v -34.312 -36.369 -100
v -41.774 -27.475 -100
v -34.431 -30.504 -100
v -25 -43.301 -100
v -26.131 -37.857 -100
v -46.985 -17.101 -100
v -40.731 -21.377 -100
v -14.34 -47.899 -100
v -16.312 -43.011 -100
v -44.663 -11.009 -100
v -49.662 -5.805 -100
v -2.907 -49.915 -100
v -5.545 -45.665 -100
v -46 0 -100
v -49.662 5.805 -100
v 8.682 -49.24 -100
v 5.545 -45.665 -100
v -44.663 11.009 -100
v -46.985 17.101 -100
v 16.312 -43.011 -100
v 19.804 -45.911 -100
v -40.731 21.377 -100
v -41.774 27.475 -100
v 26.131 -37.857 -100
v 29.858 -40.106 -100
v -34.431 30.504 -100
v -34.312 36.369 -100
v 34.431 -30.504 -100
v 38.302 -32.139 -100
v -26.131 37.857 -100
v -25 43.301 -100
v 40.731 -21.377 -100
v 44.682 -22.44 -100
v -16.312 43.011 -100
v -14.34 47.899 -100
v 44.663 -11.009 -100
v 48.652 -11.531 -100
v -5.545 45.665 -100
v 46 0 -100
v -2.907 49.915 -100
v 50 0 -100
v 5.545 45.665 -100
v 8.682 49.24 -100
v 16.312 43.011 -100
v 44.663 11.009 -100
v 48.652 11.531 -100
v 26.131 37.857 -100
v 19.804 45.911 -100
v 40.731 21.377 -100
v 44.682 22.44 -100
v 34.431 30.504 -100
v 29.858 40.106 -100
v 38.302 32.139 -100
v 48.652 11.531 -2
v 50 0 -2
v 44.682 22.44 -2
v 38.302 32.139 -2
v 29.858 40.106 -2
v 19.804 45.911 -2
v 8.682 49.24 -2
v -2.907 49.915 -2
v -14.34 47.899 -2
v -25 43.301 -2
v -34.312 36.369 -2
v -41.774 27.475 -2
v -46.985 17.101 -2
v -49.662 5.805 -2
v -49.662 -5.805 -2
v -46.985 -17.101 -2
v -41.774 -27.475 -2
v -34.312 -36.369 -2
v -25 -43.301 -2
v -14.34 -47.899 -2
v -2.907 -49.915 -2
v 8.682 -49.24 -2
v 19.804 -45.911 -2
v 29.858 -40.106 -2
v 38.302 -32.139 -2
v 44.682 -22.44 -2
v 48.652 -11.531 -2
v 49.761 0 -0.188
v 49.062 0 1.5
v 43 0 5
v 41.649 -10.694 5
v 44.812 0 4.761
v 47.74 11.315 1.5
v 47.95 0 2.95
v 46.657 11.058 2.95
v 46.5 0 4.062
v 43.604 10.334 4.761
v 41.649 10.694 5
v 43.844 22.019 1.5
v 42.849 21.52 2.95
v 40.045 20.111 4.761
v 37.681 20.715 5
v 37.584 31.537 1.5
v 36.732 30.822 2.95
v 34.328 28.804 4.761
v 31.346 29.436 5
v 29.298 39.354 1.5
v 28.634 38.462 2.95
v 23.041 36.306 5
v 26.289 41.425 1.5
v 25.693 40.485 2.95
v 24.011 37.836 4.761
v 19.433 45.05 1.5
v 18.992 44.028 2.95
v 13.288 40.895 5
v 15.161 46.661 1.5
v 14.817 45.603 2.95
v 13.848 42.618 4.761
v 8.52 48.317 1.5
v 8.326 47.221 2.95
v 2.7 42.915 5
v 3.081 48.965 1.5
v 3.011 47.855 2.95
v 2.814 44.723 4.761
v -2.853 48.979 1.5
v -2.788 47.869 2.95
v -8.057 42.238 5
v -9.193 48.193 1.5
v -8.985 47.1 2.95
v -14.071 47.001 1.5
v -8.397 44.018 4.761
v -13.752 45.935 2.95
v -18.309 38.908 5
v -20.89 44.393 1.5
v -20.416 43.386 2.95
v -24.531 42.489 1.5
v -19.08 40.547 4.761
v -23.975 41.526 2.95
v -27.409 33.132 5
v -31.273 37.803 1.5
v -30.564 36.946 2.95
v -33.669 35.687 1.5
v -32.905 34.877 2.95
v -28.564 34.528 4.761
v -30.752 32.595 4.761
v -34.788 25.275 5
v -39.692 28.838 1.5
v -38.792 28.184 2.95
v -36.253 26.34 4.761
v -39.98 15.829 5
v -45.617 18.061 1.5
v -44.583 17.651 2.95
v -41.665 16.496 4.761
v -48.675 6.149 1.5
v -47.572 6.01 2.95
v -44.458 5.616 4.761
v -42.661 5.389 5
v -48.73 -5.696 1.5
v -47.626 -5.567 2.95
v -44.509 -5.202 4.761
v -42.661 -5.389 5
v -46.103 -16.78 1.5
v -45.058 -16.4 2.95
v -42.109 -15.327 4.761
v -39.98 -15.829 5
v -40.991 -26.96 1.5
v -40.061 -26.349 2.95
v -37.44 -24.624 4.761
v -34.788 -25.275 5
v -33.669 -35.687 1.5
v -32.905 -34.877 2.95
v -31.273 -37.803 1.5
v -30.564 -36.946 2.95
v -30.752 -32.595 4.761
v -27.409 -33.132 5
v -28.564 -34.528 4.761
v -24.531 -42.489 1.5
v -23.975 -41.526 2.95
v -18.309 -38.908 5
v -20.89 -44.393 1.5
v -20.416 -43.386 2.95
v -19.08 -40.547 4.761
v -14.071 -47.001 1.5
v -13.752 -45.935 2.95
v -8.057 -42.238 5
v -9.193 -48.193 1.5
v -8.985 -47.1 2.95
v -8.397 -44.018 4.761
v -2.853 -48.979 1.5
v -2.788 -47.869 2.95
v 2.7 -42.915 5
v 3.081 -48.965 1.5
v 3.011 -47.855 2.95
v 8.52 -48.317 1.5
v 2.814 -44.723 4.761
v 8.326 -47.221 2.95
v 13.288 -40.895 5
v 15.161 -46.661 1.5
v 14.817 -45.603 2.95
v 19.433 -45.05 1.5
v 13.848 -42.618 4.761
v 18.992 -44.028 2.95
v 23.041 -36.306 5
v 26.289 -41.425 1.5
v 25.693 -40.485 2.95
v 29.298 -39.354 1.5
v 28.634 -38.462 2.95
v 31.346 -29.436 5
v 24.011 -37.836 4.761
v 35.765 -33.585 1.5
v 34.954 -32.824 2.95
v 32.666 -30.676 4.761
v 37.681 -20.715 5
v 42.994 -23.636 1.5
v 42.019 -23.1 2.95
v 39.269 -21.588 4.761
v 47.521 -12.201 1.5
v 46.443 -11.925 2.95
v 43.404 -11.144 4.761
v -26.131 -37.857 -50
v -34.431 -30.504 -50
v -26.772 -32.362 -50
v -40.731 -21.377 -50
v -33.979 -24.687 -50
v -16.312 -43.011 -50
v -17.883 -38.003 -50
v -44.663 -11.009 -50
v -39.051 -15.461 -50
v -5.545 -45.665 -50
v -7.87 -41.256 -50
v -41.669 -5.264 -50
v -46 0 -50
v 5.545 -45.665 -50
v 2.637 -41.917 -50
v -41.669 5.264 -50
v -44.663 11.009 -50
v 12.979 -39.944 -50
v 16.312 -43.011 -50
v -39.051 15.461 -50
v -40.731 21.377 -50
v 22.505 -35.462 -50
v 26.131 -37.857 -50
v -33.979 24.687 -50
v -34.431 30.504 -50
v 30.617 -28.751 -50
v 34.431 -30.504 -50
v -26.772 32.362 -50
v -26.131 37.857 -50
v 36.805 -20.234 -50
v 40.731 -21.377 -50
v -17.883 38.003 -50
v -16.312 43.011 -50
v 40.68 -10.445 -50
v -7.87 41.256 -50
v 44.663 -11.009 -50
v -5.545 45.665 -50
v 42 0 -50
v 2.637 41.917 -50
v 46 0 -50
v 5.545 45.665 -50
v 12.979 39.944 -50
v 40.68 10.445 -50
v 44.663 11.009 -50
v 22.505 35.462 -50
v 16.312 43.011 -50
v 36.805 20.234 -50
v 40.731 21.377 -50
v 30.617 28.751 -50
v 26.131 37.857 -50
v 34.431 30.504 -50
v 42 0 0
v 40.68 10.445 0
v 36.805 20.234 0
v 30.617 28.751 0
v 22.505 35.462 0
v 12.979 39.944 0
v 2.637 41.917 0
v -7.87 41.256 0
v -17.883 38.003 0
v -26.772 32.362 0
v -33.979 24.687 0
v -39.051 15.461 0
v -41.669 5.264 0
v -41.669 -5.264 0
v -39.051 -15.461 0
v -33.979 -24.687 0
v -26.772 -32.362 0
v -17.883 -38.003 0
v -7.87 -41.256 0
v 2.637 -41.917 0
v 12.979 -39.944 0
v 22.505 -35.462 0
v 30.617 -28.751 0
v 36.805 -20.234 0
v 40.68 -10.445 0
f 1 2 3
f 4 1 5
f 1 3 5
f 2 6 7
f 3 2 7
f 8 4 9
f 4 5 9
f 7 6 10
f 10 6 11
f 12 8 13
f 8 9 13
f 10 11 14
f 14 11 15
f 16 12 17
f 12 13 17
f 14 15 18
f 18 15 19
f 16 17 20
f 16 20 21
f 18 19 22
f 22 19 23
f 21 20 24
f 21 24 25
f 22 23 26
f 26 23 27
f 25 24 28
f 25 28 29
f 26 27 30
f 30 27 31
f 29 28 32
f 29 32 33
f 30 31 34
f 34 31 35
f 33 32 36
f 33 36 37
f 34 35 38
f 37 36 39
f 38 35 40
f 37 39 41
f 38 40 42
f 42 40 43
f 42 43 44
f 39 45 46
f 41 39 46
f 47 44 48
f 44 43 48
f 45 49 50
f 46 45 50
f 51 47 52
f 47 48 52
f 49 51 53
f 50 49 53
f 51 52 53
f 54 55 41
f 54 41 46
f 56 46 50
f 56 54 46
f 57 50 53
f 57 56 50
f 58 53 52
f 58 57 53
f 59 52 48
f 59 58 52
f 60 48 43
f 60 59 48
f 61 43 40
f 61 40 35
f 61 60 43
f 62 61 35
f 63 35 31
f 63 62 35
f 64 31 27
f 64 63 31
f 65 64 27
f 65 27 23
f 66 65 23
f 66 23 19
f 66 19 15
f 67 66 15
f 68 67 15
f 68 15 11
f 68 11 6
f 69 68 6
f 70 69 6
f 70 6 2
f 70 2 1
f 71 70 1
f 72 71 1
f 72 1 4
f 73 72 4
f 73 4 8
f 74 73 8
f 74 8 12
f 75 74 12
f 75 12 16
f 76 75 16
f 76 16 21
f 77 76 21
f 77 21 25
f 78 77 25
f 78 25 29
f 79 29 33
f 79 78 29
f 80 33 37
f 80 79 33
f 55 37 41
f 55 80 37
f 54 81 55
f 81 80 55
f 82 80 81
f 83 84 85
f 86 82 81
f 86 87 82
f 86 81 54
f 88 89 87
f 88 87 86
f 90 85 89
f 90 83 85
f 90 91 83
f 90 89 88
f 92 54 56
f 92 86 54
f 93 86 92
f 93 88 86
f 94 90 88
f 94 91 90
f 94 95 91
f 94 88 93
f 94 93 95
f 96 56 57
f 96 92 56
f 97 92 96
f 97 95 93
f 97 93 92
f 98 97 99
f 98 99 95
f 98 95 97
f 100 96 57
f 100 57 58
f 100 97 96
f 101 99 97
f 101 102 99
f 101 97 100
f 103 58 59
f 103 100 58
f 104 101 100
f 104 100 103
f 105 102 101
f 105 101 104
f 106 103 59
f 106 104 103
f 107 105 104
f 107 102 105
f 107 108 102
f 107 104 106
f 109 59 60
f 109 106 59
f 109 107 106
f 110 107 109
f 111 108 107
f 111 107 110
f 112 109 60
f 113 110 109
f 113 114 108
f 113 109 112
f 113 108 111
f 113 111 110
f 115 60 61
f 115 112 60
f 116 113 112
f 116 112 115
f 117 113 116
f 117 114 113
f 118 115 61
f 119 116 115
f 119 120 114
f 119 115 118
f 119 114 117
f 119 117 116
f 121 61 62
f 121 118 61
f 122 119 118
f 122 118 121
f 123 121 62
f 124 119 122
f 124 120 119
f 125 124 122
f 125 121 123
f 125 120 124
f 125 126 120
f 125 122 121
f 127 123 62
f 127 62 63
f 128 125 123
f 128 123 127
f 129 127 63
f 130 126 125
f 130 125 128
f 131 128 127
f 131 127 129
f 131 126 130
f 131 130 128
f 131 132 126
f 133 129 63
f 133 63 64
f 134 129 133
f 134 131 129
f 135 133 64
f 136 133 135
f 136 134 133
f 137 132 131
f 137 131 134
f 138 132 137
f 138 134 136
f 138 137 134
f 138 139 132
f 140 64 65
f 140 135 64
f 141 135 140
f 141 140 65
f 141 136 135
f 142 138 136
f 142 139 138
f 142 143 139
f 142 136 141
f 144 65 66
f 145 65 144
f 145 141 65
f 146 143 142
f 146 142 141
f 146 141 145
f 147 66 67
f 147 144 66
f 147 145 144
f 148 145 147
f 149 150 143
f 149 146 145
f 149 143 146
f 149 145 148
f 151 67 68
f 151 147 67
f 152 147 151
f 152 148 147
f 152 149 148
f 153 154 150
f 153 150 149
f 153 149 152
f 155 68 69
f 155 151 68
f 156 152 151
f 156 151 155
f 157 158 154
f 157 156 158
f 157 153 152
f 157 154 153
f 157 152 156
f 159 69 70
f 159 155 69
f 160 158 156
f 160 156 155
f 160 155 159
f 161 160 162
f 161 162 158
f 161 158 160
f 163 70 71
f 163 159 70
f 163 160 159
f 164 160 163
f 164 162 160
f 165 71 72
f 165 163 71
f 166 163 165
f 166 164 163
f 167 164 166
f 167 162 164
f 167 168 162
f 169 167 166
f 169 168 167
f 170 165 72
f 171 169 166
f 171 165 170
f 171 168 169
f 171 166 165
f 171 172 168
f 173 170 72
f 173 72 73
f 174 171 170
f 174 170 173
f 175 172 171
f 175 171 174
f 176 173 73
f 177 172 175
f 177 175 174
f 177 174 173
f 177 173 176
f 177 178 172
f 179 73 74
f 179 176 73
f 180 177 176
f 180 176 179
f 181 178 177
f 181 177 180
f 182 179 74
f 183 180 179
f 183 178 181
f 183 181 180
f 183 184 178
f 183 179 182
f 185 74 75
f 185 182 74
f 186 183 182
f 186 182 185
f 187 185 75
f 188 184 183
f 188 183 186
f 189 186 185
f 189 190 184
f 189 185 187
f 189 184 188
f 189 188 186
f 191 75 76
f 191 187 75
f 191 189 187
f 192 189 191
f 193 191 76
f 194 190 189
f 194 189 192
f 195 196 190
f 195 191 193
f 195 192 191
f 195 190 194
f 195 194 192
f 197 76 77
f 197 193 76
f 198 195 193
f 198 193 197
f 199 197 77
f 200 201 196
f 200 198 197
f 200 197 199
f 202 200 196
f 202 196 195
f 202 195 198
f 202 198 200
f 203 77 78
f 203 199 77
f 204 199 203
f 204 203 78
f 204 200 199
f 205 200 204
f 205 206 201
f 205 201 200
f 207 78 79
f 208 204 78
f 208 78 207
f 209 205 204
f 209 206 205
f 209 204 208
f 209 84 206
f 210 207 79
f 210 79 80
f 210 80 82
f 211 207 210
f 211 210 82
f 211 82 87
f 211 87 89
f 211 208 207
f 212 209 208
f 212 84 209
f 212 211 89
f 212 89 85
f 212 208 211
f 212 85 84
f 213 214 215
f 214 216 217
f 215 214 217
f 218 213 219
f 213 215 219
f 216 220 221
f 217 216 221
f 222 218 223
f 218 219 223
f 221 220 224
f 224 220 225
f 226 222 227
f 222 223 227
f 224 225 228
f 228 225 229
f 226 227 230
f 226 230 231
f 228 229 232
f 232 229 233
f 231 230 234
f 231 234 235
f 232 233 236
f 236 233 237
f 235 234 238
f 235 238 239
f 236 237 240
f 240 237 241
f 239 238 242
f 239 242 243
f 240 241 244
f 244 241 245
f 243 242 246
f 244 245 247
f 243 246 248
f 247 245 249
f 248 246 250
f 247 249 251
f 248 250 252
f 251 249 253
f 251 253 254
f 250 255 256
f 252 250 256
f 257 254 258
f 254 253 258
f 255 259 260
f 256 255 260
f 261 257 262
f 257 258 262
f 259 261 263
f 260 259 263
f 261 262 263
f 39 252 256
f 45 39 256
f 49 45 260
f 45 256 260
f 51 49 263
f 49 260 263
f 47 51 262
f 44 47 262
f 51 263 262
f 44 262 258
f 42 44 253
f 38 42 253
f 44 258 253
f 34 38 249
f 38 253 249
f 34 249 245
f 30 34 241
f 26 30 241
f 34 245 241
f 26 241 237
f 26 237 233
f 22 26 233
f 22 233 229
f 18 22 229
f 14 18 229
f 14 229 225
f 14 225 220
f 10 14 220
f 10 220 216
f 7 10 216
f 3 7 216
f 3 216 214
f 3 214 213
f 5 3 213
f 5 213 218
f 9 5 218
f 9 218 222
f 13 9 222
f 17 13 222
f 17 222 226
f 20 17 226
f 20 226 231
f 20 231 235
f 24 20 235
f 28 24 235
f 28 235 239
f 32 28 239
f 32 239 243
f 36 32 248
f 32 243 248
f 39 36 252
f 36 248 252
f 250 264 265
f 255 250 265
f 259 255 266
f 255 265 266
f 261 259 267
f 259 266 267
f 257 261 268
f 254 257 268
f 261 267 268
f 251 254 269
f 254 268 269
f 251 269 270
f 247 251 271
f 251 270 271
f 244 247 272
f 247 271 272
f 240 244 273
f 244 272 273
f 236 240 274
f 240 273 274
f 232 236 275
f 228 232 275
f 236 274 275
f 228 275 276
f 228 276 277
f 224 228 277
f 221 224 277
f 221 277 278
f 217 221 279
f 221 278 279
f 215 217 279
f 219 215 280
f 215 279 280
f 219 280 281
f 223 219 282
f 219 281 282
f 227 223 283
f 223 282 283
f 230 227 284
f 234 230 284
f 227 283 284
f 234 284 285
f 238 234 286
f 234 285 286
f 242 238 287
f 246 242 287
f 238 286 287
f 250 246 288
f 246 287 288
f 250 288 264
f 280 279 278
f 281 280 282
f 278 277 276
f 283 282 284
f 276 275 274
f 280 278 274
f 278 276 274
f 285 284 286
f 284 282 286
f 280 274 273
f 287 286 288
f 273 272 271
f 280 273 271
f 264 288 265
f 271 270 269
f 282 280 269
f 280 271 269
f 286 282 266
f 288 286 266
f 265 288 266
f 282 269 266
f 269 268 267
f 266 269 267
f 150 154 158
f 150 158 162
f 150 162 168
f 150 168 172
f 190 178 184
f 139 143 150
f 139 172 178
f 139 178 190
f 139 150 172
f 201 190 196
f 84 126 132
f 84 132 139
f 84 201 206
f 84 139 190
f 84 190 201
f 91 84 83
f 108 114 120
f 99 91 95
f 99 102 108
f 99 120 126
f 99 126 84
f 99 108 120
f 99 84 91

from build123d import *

# Parameters (mm, degrees)
F0_R     = 50
F0_R_2   = 46
F0_R_3   = 42
F1_DEPTH = 5
F2_DEPTH = 50
F3_DEPTH = 100
F4_R     = 7


with BuildPart() as f1:
    # F0 (on Top) → F1 (new body)
    with BuildSketch(Plane.XY):
        Circle(F0_R)
        Circle(F0_R_2, mode=Mode.SUBTRACT)
        Circle(F0_R_2)
        Circle(F0_R_3, mode=Mode.SUBTRACT)
        Circle(F0_R_3)
    extrude(amount=F1_DEPTH)

    # F0 (on Top) → F2 (join)
    with BuildSketch(Plane.XY):
        Circle(F0_R_2)
        Circle(F0_R_3, mode=Mode.SUBTRACT)
    extrude(amount=-F2_DEPTH)

    # F0 (on Top) → F3 (join)
    with BuildSketch(Plane.XY):
        Circle(F0_R)
        Circle(F0_R_2, mode=Mode.SUBTRACT)
    extrude(amount=-F3_DEPTH)

    # F4
    f4_edges = [f1.edges().sort_by_distance(p)[0] for p in [
        (-50, 0, 5),
    ]]
    fillet(f4_edges, radius=F4_R)


solid = f1.part
